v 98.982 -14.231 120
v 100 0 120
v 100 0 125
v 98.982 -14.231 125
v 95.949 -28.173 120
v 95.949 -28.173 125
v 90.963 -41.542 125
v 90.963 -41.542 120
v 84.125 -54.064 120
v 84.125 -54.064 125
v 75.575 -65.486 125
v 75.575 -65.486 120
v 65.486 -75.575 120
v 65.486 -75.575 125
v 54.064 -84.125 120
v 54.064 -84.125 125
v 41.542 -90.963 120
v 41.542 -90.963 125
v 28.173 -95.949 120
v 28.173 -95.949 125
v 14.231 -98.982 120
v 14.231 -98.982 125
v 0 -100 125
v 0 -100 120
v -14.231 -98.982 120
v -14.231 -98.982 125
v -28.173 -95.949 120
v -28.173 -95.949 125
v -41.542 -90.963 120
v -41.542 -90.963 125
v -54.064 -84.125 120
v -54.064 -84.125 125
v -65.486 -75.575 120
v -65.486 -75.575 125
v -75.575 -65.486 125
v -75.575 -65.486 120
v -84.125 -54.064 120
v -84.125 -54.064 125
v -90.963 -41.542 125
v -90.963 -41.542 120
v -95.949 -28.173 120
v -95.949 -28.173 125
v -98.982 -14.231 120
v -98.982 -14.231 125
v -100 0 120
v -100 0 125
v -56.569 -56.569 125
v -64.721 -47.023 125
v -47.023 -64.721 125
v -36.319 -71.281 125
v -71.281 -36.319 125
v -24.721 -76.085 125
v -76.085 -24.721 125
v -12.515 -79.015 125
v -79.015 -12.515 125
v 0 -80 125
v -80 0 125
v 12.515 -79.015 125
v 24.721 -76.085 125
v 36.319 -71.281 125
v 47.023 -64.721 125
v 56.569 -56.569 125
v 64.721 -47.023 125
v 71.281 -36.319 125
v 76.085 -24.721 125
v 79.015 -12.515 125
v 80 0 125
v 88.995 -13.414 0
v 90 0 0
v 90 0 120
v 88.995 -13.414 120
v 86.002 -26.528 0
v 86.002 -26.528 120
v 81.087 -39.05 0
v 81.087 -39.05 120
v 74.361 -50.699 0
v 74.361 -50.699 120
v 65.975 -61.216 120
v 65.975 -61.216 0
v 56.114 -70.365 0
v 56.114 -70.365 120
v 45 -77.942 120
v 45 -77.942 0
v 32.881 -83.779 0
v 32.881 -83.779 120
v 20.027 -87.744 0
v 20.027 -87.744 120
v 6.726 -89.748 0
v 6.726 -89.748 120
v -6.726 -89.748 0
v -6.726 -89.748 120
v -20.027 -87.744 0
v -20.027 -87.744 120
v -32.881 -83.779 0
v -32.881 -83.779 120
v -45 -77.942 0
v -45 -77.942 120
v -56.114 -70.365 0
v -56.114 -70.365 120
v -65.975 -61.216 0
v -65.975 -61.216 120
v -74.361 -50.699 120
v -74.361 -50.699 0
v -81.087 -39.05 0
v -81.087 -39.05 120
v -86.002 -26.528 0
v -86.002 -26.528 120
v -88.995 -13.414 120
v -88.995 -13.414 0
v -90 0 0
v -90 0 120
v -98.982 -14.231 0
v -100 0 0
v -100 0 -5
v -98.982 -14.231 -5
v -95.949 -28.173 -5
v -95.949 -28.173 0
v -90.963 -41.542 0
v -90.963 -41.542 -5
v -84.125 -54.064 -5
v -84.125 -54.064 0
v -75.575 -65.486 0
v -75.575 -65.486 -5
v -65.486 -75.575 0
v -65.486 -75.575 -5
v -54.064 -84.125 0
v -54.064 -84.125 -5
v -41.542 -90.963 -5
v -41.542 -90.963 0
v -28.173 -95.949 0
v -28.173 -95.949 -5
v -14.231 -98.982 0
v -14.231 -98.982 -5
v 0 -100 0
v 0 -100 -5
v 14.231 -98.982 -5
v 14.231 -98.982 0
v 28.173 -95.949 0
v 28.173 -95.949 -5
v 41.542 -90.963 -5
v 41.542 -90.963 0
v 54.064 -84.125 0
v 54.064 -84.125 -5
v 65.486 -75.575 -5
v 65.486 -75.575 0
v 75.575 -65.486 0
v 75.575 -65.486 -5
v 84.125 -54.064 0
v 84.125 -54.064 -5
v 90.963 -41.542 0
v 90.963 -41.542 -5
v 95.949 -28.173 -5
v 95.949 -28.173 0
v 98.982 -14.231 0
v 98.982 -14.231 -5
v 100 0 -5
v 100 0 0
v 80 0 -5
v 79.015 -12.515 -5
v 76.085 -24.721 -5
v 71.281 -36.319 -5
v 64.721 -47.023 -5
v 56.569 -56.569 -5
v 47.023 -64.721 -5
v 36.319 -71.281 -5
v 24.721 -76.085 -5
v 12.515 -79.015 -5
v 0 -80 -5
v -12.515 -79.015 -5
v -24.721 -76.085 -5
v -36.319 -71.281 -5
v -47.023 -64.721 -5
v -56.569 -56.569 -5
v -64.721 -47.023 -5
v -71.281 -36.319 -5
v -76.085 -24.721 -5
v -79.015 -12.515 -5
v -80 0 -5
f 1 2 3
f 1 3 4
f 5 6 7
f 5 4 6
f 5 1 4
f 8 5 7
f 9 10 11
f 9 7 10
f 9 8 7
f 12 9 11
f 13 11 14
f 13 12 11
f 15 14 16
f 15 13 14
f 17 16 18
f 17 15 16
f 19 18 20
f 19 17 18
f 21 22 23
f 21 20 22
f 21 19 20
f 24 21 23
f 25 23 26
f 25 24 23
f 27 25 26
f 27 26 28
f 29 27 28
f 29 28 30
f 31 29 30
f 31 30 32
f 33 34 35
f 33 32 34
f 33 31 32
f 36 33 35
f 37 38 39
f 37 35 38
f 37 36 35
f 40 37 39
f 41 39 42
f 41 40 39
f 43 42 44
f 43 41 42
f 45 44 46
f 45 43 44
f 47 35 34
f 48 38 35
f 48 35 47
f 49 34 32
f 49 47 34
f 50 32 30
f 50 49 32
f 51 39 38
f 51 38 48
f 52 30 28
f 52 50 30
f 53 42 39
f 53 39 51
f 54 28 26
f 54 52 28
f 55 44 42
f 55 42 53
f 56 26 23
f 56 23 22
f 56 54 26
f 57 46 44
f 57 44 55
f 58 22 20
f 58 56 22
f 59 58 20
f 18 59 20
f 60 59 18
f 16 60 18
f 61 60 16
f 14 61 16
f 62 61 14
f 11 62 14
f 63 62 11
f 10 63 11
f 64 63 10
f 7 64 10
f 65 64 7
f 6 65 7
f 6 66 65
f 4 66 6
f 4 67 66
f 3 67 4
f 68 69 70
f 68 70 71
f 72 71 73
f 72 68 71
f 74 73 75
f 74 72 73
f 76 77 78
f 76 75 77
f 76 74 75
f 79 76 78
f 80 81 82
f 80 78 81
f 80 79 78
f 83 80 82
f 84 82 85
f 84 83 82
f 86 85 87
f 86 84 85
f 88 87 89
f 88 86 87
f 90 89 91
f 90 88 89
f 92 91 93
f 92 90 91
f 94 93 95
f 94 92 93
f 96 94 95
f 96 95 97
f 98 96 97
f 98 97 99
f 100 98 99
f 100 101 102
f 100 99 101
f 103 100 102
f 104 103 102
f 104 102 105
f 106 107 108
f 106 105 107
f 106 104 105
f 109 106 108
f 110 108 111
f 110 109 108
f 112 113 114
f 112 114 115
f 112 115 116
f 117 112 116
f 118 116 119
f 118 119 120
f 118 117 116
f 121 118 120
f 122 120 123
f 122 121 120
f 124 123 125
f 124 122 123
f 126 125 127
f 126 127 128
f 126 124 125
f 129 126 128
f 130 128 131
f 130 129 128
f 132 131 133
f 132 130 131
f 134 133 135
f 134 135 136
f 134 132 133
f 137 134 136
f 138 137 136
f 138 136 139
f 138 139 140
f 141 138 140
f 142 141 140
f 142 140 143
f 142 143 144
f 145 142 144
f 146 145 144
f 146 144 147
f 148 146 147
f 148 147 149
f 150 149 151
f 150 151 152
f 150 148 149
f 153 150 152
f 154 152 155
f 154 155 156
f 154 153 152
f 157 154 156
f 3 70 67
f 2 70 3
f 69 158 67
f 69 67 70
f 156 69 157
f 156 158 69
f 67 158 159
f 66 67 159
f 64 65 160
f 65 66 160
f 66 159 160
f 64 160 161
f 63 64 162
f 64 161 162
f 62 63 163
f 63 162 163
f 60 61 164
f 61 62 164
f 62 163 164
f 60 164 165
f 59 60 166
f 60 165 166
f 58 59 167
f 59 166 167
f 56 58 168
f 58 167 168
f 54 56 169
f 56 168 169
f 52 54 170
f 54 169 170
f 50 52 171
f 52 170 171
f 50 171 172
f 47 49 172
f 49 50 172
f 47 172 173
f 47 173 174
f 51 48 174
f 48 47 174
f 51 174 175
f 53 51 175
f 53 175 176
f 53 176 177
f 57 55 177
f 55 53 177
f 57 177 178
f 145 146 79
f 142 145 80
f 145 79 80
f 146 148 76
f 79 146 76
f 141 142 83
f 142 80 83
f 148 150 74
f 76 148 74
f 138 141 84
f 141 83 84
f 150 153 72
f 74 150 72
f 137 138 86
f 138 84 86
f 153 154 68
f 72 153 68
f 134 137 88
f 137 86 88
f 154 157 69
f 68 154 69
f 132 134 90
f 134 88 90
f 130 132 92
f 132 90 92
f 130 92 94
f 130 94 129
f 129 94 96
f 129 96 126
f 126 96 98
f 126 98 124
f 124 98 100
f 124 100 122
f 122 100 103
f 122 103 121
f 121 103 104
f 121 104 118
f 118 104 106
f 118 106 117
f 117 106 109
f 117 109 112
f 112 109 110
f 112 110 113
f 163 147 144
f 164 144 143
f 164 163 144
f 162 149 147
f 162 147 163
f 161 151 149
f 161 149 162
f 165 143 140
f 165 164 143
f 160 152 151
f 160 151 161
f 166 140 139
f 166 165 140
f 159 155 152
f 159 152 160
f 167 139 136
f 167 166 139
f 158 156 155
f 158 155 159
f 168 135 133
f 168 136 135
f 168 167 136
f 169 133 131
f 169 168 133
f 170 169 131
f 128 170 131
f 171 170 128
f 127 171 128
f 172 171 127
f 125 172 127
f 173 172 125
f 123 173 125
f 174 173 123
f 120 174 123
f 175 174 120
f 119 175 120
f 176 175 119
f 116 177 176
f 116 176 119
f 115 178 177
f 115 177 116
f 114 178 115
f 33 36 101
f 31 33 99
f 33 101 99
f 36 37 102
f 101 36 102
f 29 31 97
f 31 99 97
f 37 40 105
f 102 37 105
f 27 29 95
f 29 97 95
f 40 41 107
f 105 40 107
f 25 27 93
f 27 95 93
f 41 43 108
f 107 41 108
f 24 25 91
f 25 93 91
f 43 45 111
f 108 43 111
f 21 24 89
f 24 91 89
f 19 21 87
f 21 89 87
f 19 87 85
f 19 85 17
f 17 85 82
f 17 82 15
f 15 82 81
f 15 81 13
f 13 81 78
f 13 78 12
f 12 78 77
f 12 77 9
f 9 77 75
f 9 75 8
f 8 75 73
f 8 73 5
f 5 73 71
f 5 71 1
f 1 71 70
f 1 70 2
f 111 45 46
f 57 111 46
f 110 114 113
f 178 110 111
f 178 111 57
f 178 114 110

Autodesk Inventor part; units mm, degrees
ref_plane "YZ Plane" through (0, 0, 0) normal (1, 0, 0) x (0, 1, 0)
ref_plane "XZ Plane" through (0, 0, 0) normal (0, 1, 0) x (-1, 0, 0)
sketch "Эскиз1" plane through (0, 0, 0) normal (0, 0, 1) x (1, 0, 0)
  circle A0 centre (0, 0) radius 80
  circle A1 centre (0, 0) radius 90
  line L0 (-90, 0) -> (90, 0)
  point P0 (-80, 0)
  point P1 (80, 0)
  dimension "d0" = 160
  dimension "d1" = 180
extrude "Выдавливание1" add sketch "Эскиз1" along normal blind 120 contours L0 A1 A0 picked at (54.1763, -63.1025)
sketch "Эскиз3" plane through (0, 0, 120) normal (0, 0, 1) x (1, 0, 0)
  arc A0 (-90, 0) -> (90, 0) centre (0, 0) ccw projected
  line L0 (90, 0) -> (80, 0) projected
  arc A1 (-80, 0) -> (80, 0) centre (0, 0) ccw projected
  line L1 (-80, 0) -> (-90, 0) projected
  circle A2 centre (0, 0) radius 100
  arc A3 (-90, 0) -> (90, 0) centre (0, 0) ccw projected
  line L2 (-90, 0) -> (-100, 0)
  line L3 (90, 0) -> (100, 0)
  dimension "d7" = 200
extrude "Выдавливание3" add sketch "Эскиз3" along normal blind 5 contours L1 A1 L0 A0 | A0 L3 A2 L2
ref_plane "РабПлоскость2" through (0, 0, 60) normal (0, 0, -1) x (-1, 0, 0)
mirror "Зеркальное отражение1" about plane through (0, 0, 60) normal (0, 0, -1) of "Выдавливание3"
properties part number "Верхняя часть коренного подшипника" material "Бронза, литейная"
